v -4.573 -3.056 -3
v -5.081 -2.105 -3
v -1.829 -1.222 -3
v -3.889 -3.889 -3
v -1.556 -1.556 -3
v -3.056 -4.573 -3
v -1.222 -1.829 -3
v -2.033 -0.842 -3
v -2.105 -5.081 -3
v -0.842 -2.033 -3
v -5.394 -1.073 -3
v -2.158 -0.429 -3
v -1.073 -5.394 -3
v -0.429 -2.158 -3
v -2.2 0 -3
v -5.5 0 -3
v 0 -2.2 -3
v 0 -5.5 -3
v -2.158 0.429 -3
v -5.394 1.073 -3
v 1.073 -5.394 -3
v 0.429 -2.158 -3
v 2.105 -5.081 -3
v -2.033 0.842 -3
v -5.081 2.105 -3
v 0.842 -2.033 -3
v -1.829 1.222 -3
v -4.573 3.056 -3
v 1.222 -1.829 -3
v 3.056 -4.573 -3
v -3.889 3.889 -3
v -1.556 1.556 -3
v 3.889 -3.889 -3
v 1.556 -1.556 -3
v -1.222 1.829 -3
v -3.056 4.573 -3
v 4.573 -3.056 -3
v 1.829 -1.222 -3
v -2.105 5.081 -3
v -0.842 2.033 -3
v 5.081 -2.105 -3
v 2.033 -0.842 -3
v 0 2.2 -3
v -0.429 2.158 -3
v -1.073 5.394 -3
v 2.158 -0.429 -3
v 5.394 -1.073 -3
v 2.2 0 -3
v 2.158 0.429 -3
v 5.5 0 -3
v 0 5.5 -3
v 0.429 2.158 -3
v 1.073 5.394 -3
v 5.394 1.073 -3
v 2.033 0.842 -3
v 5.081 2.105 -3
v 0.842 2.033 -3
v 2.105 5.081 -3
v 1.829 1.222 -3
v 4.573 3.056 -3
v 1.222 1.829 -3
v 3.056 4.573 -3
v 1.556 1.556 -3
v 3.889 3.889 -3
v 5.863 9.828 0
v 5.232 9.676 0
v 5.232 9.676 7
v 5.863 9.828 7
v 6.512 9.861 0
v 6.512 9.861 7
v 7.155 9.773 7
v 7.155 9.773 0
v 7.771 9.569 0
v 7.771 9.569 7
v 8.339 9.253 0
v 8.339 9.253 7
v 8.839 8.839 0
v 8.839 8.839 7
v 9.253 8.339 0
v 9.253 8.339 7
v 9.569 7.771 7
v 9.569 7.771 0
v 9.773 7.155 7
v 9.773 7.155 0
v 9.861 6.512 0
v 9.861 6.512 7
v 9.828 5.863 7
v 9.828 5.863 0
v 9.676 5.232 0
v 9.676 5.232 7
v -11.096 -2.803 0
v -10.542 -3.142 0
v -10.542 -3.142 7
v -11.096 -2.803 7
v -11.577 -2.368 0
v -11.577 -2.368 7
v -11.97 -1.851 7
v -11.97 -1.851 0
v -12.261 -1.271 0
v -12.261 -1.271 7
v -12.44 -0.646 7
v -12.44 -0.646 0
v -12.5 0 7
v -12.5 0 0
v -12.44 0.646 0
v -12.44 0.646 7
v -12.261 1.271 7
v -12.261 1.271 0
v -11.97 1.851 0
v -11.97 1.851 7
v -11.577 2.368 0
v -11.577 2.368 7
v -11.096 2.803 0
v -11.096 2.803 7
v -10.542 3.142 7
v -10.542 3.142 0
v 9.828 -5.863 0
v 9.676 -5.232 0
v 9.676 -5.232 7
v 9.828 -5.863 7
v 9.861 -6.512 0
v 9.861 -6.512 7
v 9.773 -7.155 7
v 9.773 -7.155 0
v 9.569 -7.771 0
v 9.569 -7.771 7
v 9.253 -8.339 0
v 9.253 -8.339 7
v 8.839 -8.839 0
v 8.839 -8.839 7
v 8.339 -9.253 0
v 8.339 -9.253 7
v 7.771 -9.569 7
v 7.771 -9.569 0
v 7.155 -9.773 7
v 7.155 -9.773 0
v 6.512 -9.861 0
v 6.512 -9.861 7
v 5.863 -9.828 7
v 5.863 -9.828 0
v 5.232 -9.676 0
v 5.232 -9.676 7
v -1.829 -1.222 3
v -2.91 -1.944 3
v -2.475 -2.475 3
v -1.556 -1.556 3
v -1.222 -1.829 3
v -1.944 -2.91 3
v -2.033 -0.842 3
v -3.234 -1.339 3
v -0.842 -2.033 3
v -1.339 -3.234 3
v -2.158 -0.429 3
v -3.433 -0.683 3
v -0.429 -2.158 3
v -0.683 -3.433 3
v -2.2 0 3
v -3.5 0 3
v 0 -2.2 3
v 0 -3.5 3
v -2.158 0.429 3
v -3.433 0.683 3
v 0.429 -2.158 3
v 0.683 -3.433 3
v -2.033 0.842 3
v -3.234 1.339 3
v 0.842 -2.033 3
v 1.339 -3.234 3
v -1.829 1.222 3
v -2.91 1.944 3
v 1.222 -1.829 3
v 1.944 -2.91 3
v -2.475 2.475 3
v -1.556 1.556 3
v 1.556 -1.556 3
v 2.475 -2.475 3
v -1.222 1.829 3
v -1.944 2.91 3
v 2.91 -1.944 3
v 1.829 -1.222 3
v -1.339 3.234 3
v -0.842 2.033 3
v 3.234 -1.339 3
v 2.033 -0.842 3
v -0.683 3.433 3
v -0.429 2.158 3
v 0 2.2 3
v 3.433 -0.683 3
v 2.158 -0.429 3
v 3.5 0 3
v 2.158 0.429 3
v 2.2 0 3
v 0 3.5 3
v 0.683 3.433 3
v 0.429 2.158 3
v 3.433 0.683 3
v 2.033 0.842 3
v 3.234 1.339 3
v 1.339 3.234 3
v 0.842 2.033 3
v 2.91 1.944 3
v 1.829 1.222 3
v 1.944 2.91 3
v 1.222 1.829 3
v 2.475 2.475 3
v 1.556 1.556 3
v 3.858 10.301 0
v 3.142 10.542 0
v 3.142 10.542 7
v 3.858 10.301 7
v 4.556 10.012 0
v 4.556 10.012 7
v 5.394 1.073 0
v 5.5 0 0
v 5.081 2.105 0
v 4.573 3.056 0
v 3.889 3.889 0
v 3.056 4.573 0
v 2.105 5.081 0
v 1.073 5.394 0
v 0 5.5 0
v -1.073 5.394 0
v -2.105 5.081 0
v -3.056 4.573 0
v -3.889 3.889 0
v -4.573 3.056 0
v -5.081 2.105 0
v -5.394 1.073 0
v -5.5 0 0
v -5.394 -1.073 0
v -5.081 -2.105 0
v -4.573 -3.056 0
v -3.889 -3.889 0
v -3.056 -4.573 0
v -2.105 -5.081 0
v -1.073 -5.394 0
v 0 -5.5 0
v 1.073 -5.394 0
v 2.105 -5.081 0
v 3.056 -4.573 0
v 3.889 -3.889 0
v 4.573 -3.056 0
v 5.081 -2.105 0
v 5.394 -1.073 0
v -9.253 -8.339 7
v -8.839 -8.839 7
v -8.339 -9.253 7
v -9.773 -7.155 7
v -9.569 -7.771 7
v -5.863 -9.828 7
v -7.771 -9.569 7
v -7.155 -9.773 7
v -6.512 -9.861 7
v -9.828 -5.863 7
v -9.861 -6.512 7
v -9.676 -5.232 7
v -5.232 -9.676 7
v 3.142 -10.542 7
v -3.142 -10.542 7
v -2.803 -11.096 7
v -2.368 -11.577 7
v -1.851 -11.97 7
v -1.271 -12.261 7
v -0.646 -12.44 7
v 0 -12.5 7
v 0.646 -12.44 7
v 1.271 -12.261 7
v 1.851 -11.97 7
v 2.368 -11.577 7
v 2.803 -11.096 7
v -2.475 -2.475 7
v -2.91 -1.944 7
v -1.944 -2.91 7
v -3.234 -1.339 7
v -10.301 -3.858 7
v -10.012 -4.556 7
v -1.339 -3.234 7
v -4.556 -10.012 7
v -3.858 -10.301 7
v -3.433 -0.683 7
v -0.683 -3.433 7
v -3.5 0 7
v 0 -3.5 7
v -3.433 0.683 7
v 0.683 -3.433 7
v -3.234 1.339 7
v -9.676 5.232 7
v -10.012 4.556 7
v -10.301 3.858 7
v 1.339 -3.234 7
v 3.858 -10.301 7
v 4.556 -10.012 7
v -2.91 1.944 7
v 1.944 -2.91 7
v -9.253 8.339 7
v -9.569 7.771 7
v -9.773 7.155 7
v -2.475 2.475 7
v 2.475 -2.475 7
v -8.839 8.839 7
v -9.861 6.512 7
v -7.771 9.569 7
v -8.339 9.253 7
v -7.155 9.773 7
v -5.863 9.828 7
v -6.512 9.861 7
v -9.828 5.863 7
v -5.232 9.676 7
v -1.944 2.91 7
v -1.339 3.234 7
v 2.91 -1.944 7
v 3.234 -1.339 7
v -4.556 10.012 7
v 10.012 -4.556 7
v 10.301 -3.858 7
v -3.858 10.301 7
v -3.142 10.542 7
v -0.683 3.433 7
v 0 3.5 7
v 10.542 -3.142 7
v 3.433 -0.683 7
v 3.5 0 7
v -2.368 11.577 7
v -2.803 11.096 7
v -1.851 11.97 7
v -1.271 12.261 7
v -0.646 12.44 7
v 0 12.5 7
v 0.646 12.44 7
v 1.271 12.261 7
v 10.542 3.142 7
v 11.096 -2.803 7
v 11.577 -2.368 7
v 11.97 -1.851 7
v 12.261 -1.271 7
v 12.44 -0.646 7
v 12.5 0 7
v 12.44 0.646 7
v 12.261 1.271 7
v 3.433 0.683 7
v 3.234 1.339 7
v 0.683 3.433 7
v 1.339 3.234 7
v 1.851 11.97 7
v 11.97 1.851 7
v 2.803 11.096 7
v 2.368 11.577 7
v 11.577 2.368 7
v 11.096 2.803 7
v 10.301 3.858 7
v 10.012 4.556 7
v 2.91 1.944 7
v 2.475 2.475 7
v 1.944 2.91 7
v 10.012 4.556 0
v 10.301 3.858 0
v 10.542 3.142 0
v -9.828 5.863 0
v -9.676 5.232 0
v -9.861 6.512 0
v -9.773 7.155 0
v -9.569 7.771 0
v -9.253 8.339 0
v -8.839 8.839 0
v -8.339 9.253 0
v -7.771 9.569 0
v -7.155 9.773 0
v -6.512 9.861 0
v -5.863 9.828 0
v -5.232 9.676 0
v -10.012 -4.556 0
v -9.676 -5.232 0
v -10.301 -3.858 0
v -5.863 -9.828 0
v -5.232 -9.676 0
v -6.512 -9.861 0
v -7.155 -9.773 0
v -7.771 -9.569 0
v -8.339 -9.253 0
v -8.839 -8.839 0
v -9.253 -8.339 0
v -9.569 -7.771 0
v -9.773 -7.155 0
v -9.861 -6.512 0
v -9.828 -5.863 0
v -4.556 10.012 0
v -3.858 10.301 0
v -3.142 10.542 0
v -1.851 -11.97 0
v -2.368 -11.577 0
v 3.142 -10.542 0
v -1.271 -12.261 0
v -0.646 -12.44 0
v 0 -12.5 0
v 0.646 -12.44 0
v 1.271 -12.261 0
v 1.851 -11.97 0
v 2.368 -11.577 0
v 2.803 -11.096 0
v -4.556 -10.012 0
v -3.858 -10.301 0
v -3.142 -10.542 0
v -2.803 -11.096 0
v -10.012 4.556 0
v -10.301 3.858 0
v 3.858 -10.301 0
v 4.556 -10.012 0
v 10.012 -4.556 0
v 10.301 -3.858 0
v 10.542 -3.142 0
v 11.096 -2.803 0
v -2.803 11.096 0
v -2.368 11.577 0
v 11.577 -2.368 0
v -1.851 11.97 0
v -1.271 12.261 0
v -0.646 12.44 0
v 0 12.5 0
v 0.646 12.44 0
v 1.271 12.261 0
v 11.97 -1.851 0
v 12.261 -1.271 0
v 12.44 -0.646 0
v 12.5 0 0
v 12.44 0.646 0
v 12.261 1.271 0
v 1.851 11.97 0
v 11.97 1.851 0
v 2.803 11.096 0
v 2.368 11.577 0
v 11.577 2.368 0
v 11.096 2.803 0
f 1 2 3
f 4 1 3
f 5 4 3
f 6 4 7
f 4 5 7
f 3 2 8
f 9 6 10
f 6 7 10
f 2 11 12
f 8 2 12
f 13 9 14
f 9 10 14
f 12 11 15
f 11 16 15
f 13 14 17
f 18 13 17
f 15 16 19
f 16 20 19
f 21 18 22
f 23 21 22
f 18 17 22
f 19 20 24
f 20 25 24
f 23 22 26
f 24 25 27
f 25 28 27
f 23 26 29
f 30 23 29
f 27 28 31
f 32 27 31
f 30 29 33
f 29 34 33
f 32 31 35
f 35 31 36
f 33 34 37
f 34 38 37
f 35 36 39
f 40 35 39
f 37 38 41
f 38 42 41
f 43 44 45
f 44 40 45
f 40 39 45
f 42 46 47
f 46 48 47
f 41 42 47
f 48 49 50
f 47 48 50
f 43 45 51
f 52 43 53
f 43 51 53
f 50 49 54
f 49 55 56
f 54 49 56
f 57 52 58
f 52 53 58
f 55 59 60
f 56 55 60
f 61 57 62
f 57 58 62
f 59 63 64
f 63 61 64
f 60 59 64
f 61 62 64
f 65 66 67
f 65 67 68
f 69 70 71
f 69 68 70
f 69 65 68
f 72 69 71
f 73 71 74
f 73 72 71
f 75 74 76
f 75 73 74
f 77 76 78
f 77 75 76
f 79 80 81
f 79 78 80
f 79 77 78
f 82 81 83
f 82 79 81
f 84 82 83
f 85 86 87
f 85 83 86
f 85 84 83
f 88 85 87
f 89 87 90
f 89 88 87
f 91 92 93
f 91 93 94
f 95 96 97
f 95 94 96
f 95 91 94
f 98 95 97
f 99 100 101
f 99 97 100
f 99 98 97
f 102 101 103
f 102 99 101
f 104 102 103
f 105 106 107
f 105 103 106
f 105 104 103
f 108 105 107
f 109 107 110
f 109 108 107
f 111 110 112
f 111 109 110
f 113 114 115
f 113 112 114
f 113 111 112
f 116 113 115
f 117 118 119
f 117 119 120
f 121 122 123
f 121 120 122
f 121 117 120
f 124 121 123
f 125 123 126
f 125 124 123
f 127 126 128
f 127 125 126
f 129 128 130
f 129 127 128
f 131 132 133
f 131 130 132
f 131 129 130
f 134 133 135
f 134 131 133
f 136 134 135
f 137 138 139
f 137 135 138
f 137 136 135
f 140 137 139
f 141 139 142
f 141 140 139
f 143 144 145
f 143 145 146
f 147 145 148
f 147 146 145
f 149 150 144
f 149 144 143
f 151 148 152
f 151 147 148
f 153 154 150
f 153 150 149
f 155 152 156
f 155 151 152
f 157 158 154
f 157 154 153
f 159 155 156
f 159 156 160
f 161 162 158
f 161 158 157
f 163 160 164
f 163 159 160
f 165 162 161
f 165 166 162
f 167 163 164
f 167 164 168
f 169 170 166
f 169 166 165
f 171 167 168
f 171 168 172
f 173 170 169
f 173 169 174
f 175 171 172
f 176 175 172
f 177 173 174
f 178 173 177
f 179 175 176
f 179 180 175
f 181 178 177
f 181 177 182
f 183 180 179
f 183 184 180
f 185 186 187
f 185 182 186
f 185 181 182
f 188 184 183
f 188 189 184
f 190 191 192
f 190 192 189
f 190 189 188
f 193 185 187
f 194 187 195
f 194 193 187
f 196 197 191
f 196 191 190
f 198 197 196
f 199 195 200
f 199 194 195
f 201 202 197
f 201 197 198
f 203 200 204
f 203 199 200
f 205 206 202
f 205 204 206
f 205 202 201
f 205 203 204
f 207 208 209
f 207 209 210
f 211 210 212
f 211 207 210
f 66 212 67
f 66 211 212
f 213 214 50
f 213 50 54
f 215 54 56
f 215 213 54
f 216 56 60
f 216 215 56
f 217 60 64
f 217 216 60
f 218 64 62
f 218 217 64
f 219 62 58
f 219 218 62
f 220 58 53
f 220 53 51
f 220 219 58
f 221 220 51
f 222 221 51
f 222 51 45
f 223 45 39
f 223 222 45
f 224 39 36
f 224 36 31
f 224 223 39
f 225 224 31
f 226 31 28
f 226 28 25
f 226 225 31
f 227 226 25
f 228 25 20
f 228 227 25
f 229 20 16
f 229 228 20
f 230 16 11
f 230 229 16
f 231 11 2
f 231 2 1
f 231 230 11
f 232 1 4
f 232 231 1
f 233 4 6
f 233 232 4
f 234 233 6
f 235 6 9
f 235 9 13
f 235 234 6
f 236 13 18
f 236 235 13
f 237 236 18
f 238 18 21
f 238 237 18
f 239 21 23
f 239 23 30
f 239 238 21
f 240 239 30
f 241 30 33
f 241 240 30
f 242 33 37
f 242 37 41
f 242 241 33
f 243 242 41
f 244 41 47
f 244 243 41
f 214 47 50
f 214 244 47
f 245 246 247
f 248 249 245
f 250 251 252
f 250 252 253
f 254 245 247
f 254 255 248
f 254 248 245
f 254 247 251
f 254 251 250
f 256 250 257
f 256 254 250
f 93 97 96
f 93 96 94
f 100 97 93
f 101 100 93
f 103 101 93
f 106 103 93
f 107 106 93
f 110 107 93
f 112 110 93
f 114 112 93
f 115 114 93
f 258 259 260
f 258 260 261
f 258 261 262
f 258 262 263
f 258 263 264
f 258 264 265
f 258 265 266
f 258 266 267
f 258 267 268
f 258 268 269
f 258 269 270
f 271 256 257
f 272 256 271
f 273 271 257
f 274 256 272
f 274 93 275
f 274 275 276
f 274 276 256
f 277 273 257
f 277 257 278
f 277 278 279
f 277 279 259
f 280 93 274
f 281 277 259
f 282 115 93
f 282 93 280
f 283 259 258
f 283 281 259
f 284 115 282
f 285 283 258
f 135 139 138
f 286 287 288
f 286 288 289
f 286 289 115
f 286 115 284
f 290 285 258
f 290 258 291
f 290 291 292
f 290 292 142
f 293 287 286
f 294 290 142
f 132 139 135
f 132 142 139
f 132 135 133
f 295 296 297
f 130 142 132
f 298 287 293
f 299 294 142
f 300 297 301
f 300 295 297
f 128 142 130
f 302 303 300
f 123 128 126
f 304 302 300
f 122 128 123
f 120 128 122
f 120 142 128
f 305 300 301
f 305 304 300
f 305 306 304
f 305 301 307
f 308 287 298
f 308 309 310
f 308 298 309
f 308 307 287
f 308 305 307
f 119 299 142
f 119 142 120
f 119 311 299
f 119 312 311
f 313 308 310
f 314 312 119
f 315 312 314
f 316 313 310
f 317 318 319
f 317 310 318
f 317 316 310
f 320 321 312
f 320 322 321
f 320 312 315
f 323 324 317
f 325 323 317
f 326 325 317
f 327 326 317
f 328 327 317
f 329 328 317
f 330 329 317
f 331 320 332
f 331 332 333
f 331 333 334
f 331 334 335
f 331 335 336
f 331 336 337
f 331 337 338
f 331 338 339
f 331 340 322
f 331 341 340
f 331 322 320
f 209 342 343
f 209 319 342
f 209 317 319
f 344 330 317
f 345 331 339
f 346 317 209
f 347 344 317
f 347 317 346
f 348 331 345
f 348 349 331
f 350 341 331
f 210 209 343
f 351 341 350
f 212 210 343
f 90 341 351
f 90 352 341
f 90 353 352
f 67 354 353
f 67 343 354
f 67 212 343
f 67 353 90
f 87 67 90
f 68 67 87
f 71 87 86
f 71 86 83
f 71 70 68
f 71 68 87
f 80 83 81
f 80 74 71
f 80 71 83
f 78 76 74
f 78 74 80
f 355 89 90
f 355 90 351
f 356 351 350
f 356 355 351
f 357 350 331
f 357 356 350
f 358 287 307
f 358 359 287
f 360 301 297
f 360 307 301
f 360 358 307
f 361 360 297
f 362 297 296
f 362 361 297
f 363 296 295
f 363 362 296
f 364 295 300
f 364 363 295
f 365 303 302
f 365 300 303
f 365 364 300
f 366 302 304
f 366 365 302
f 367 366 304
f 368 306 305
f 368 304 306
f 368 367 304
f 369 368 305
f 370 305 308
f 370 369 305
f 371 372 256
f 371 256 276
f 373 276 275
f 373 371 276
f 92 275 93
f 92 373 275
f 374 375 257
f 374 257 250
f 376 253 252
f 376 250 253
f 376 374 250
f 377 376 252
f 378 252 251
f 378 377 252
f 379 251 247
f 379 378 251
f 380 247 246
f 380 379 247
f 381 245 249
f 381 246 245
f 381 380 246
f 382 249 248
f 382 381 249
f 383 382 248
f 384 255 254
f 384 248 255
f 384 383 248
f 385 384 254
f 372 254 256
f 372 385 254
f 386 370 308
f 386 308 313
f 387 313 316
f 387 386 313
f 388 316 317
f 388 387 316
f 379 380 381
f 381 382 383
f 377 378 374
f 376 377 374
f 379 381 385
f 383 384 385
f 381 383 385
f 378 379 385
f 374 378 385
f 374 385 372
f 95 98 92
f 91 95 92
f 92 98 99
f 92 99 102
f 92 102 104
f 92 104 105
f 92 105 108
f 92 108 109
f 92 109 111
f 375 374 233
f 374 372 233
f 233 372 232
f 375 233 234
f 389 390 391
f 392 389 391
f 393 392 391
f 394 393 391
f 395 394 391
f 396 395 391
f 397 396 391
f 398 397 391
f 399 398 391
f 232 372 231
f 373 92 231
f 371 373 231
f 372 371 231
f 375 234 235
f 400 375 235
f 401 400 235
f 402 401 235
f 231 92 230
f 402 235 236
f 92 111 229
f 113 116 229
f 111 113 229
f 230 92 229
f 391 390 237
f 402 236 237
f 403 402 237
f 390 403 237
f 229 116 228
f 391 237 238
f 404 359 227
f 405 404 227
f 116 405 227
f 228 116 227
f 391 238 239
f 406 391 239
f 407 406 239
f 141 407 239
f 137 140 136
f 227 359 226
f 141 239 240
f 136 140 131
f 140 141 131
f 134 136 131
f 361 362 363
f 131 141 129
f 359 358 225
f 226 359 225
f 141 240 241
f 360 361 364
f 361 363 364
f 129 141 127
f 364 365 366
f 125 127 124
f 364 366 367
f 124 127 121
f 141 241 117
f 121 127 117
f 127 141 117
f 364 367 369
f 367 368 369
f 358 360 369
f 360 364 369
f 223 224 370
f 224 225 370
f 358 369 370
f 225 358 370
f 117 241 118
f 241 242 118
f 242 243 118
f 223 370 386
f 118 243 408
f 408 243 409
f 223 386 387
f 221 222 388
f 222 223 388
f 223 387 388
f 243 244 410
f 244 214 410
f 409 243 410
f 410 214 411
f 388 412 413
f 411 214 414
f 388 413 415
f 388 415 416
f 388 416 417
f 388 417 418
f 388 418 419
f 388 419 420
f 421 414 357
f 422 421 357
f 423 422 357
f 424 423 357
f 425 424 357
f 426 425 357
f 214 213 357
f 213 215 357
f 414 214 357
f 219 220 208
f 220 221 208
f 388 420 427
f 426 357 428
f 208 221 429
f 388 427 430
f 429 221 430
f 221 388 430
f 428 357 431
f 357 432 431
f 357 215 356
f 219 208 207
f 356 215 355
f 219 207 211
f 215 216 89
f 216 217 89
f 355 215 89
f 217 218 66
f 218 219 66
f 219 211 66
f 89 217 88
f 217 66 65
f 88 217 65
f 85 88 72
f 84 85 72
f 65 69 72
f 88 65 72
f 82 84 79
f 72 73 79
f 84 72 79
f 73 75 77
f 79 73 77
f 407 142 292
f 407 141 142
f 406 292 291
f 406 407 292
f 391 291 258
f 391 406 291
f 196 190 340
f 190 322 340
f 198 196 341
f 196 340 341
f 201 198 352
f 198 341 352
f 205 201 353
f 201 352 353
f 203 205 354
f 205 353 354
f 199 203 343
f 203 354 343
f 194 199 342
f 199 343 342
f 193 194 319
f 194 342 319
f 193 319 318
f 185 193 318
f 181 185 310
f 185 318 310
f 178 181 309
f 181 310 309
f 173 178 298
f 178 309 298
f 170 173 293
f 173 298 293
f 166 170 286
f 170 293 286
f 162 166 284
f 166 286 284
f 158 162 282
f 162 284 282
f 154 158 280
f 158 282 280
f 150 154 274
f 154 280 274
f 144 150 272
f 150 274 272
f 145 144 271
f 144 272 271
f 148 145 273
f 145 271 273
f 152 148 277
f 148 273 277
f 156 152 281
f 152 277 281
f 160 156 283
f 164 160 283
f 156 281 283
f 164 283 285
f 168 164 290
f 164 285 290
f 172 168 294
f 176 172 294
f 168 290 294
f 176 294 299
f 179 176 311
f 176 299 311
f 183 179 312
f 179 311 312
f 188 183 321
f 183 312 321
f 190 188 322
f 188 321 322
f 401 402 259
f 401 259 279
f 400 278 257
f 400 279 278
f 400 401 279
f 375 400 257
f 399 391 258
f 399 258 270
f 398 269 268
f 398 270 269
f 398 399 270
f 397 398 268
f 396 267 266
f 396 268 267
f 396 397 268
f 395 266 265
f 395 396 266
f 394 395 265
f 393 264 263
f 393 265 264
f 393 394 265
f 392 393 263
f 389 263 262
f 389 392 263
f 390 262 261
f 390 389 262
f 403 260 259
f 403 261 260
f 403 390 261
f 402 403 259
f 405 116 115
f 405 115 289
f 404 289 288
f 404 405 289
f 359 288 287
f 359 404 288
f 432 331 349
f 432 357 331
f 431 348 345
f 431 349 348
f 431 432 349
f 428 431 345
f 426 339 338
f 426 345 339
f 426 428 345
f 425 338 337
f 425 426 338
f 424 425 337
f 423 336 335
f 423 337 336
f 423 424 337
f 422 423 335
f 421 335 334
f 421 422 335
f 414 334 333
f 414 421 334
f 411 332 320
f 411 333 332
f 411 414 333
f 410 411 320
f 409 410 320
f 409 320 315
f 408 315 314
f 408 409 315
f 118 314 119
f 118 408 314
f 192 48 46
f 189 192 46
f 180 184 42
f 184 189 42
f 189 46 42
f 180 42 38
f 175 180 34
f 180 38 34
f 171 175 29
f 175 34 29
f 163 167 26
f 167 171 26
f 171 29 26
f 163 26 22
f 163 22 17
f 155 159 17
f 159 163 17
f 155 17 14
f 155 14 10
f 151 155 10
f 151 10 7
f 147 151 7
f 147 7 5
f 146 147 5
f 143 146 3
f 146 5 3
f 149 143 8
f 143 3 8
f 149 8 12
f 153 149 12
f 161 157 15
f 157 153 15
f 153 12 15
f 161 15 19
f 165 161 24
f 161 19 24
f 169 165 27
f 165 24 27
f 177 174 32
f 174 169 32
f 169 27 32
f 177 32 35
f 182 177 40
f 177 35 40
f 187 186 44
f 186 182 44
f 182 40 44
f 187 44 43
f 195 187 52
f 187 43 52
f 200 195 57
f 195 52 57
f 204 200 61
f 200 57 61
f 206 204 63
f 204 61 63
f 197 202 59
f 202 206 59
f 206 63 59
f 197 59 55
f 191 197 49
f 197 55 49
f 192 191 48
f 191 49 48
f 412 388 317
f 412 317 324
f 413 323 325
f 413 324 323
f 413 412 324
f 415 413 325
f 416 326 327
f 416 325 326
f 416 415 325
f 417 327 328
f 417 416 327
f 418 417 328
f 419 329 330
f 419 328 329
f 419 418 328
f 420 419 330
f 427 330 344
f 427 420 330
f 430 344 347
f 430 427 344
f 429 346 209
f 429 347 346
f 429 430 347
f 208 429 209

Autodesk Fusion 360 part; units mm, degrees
sketch "Sketch1" plane through (0, 0, 0) normal (0, 0, 1) x (1, 0, 0) in component "Knob"
  circle A0 centre (0, 0) radius 11
  line L0 (0, 0) -> (0, 9) construction
  arc A1 (3.1422, 10.5417) -> (-3.1422, 10.5417) centre (0, 9) ccw
  arc A2 (-5.2322, 9.6759) -> (-9.6759, 5.2322) centre (-6.364, 6.364) ccw
  arc A3 (-10.5417, 3.1422) -> (-10.5417, -3.1422) centre (-9, 0) ccw
  arc A4 (-9.6759, -5.2322) -> (-5.2322, -9.6759) centre (-6.364, -6.364) ccw
  arc A5 (-3.1422, -10.5417) -> (3.1422, -10.5417) centre (0, -9) ccw
  arc A6 (5.2322, -9.6759) -> (9.6759, -5.2322) centre (6.364, -6.364) ccw
  arc A7 (10.5417, -3.1422) -> (10.5417, 3.1422) centre (9, 0) ccw
  arc A8 (9.6759, 5.2322) -> (5.2322, 9.6759) centre (6.364, 6.364) ccw
  circle A9 centre (0, 0) radius 5.5
  circle A10 centre (0, 0) radius 2.2
  circle A11 centre (0, 0) radius 3.5
  dimension "d1" = 22
  dimension "d2" = 7
  dimension "d4" = 360
  dimension "d5" = 11
  dimension "d6" = 4.4
  dimension "d16" = 7
extrude "Extrude1" add sketch "Sketch1" along normal blind 7 contours A0 | A0 A7 | A0 A8 | A0 A6 | A0 A1 | A0 A5 | A0 A2 | A0 A4 | A0 A3 | A9 | A11 in component "Knob"
extrude "Extrude2" add sketch "Sketch1" against normal blind 3 contours A9 | A11 in component "Knob"
extrude "Extrude3" cut sketch "Sketch1" against normal blind 4 from surface at 7 contours A11 in component "Knob"
component "Knob" placed x (1, 0, 0) y (0, 1, 0) z (0, 0, 1) at (0, 0, 0)
